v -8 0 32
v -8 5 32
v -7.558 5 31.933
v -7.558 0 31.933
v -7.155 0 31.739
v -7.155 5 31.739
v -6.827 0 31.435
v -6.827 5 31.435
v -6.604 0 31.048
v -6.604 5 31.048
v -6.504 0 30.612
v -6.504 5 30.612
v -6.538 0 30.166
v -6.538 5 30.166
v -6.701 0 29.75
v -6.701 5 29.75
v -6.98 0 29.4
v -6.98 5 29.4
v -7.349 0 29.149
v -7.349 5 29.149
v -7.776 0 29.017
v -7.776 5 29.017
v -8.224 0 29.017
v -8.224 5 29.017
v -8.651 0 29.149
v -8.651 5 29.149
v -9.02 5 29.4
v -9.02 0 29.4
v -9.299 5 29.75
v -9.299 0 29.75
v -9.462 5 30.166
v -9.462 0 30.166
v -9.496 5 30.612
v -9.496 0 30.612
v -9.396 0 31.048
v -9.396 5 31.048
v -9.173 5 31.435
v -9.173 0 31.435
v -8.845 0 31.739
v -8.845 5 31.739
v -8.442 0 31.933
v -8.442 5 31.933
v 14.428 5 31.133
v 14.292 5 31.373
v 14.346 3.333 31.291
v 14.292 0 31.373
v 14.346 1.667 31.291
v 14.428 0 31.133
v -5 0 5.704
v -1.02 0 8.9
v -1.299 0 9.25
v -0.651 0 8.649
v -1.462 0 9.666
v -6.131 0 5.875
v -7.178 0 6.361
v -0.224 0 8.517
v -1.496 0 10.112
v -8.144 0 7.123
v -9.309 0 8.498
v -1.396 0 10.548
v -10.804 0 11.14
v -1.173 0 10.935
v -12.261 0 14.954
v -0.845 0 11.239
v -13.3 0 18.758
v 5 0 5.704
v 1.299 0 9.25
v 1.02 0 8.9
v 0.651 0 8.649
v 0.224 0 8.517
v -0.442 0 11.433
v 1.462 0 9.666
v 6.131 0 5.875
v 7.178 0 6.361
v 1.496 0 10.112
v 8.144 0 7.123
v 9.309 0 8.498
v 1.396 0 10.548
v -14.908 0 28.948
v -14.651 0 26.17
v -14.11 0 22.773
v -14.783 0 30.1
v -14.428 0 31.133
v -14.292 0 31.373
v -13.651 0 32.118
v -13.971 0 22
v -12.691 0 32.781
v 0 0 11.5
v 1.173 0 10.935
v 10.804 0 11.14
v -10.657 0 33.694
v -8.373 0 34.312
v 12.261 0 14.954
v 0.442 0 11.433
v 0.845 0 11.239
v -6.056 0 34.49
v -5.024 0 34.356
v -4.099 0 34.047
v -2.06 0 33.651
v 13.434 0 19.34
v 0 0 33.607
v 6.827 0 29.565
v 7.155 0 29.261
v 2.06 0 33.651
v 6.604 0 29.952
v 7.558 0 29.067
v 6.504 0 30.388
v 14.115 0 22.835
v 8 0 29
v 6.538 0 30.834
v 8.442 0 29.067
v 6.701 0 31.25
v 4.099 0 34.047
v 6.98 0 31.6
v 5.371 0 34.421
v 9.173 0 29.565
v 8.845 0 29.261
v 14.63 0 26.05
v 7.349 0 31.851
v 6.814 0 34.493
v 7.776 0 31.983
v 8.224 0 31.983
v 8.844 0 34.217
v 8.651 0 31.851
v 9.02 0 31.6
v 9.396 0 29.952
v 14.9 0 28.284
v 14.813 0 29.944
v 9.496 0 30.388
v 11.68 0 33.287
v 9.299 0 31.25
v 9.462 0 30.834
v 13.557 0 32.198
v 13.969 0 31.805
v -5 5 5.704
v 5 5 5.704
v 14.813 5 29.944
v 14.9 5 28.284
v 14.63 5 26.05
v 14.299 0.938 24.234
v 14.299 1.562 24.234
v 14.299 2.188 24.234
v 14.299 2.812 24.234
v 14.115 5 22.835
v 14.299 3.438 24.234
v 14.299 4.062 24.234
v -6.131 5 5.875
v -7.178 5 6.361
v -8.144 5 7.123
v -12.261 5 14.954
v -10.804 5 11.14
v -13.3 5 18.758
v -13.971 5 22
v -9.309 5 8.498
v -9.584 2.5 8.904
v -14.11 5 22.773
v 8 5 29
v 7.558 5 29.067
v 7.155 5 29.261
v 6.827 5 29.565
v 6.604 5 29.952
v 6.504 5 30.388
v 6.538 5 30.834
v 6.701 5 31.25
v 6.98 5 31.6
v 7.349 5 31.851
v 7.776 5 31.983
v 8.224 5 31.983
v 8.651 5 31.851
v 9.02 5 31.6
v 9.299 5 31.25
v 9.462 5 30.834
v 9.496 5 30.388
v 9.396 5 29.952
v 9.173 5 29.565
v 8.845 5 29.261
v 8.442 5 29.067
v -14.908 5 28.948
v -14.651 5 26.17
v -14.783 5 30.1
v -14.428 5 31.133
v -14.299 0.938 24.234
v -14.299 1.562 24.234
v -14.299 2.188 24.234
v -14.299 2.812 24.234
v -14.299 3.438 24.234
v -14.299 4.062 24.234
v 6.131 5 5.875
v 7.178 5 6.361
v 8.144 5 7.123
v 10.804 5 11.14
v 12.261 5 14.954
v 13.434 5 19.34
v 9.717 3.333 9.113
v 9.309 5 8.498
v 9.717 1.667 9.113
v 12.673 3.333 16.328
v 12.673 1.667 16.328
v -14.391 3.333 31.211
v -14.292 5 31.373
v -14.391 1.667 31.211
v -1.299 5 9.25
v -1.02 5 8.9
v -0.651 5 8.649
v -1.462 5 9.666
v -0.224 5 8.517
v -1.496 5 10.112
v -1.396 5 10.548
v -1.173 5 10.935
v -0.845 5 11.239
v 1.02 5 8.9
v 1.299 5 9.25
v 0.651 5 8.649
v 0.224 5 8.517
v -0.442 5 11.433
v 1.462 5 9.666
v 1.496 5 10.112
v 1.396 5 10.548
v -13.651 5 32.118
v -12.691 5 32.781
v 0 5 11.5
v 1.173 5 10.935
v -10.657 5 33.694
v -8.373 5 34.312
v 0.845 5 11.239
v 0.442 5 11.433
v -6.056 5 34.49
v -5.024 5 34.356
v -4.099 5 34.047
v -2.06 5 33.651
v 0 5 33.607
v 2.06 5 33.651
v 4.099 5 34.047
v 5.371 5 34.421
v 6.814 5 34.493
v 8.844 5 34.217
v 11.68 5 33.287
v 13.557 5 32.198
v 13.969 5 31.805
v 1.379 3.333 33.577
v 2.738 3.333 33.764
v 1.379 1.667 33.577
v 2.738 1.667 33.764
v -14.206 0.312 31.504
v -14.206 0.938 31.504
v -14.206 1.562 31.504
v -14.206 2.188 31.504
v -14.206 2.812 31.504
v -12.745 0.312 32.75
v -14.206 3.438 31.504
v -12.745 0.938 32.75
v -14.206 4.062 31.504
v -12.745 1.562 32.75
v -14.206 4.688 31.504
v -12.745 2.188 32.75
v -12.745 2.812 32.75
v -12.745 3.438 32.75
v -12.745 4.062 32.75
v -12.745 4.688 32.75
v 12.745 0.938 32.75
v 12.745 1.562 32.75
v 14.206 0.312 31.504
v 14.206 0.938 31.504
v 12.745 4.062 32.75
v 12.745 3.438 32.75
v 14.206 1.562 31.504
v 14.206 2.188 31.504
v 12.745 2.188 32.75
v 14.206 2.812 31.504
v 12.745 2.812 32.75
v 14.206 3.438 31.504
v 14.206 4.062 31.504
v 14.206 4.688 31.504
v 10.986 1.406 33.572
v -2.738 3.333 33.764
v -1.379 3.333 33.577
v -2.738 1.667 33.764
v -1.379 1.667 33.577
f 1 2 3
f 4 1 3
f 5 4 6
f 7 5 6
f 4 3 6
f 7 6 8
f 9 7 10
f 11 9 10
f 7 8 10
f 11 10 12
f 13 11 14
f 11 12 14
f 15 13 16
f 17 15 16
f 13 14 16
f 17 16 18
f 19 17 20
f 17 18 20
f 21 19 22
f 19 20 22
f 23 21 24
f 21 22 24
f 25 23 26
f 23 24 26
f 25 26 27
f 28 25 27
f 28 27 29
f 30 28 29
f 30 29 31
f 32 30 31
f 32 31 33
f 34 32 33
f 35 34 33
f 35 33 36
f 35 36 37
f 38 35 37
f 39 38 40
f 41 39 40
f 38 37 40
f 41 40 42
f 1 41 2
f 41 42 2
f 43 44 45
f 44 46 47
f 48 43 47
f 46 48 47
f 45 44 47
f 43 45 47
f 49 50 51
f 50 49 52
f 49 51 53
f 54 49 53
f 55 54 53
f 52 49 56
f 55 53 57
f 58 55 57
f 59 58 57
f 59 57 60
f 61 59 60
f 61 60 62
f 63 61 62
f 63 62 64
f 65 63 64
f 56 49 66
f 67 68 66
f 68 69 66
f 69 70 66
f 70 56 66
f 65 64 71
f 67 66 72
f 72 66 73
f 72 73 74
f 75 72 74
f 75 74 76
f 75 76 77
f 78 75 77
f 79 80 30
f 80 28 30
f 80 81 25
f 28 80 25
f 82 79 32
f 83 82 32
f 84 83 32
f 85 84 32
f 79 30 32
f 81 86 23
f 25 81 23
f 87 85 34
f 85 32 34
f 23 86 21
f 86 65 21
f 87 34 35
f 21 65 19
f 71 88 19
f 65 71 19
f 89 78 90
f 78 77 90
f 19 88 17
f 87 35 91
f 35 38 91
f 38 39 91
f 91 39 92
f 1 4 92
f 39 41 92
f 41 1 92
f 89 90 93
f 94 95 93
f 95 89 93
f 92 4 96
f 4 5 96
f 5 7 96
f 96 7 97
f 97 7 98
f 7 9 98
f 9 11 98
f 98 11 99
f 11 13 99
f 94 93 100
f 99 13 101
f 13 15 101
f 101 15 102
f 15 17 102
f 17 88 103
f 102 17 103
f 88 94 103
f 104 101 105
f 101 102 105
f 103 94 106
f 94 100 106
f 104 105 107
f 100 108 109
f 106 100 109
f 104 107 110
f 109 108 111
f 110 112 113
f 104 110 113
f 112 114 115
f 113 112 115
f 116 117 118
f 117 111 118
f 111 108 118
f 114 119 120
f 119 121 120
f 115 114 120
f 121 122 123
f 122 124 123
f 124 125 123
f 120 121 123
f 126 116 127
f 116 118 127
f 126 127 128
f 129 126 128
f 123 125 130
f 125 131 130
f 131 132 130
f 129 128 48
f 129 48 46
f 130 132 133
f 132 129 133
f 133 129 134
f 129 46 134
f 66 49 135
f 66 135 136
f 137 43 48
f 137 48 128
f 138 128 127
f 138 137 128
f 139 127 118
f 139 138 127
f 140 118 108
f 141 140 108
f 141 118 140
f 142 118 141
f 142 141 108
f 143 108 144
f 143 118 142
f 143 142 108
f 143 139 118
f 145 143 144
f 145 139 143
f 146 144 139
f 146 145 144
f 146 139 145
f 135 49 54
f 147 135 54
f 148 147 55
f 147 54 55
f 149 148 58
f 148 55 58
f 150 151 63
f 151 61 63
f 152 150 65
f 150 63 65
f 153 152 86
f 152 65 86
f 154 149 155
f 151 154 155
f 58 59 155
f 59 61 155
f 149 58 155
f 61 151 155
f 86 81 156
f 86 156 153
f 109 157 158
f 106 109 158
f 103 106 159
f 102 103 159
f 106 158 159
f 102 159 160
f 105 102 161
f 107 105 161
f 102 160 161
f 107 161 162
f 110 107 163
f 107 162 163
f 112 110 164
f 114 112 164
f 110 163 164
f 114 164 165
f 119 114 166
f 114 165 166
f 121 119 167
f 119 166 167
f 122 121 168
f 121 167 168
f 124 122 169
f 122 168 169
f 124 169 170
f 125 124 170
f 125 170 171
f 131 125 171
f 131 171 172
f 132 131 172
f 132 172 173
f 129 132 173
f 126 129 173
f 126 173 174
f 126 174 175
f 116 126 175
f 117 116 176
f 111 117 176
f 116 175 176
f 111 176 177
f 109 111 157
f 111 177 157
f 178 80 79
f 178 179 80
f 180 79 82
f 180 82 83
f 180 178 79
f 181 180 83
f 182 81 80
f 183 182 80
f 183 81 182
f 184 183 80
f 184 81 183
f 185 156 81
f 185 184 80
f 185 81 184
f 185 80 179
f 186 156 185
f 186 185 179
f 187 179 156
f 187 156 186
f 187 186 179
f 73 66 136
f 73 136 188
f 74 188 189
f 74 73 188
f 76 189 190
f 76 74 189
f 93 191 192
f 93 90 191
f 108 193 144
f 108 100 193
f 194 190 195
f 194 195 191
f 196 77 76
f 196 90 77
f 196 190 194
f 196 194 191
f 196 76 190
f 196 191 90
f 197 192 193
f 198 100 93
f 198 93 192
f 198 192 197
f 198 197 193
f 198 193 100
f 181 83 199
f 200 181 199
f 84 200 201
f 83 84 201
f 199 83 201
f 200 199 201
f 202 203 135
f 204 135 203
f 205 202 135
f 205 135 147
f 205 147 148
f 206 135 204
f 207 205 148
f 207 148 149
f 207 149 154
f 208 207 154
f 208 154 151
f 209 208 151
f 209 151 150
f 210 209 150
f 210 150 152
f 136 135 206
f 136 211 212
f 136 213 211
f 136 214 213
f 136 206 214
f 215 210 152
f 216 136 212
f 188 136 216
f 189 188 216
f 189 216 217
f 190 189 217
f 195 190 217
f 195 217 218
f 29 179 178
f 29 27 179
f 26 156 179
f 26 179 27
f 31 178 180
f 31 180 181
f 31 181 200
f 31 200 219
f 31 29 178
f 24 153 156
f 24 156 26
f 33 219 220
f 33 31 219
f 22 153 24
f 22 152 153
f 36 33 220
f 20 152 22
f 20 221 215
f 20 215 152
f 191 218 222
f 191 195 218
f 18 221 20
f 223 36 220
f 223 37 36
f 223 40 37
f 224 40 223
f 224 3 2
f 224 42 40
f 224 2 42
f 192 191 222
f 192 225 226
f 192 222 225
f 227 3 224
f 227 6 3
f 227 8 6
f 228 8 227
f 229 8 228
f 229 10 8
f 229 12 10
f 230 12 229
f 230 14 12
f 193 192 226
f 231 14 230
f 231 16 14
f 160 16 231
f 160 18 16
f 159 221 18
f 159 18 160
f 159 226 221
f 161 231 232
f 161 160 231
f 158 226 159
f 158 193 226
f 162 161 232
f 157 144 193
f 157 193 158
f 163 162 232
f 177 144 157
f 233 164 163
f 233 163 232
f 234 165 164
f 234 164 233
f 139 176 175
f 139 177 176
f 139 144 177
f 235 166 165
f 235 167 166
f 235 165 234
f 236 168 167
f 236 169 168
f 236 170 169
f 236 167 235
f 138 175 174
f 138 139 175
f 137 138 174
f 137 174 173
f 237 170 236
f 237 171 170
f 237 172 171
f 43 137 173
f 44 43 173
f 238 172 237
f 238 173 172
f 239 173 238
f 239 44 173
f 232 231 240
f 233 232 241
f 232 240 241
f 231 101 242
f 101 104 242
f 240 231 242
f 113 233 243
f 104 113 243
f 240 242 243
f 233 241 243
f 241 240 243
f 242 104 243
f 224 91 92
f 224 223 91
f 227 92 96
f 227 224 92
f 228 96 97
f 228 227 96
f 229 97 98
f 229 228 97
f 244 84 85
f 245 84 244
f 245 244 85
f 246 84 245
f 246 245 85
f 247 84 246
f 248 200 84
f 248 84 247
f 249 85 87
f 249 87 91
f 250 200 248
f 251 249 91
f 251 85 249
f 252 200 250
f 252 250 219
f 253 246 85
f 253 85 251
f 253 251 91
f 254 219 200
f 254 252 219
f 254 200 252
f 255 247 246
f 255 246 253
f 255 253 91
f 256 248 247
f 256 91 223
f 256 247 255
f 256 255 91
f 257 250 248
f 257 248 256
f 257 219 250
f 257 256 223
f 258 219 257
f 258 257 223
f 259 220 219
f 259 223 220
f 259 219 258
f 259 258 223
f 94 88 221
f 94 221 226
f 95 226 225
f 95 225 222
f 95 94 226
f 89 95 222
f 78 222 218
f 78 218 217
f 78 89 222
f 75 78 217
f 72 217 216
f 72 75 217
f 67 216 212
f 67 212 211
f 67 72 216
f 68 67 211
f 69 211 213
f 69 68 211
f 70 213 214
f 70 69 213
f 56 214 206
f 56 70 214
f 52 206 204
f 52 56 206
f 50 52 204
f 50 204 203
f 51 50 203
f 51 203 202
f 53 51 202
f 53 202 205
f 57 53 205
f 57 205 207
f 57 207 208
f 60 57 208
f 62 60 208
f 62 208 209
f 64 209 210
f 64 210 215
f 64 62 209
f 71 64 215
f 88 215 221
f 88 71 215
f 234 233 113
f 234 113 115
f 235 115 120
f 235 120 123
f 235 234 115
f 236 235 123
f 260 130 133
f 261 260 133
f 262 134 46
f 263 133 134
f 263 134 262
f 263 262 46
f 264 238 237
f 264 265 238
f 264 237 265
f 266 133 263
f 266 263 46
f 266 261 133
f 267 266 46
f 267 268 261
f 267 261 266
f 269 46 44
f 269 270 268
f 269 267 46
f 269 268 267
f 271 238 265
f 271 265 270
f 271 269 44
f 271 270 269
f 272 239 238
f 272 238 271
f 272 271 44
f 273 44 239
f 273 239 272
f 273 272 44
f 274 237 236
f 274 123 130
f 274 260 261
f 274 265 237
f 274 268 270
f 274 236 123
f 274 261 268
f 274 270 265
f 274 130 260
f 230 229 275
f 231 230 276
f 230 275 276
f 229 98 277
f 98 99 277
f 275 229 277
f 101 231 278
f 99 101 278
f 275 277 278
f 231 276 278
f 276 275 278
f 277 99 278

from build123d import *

# Parameters (mm, degrees)
CROQUIS1_R                  = 16.5
CROQUIS1_R_2                = 3.75
CROQUIS1_R_3                = 1.5
SALIENTE_EXTRUIR1_DEPTH     = 5
CROQUIS2_R                  = 5.5
CORTAR_EXTRUIR1_DEPTH       = 2
CORTAR_EXTRUIR2_START       = -5
CROQUIS4_R                  = 3
CORTAR_EXTRUIR2_DEPTH       = 2.5
CROQUIS6_R                  = 1.5
SALIENTE_EXTRUIR3_DEPTH     = 5
SALIENTE_EXTRUIR4_START     = -5
SALIENTE_EXTRUIR4_DEPTH     = 5
CORTAR_EXTRUIR3_START       = -5
CORTAR_EXTRUIR3_OUTLINE_R   = 1.5
CORTAR_EXTRUIR3_OUTLINE_R_2 = 3.75
CORTAR_EXTRUIR3_DEPTH       = 5


# Read off the part's stored shape, not the designer's step: Saliente-Extruir4, Cortar-Extruir3
with BuildPart() as part:
    # Croquis1 → Saliente-Extruir1 (new body)
    with BuildSketch(Plane(origin=(0, 0, 0), x_dir=(1, 0, 0), z_dir=(0, 1, 0))):
        with Locations(Location((0, 0, 0), (0, 0, 270))):
            Circle(CROQUIS1_R)
        with Locations(Location((0, 0, 0), (0, 0, 270))):
            Circle(CROQUIS1_R_2, mode=Mode.SUBTRACT)
        with Locations(Location((10, 0, 0), (0, 0, 270))):
            Circle(CROQUIS1_R_3, mode=Mode.SUBTRACT)
        with Locations(Location((0, -10, 0), (0, 0, 270))):
            Circle(CROQUIS1_R_3, mode=Mode.SUBTRACT)
        with Locations(Location((-10, 0, 0), (0, 0, 270))):
            Circle(CROQUIS1_R_3, mode=Mode.SUBTRACT)
        with Locations(Location((0, 10, 0), (0, 0, 270))):
            Circle(CROQUIS1_R_3, mode=Mode.SUBTRACT)
    extrude(amount=SALIENTE_EXTRUIR1_DEPTH)

    # Croquis2 → Cortar-Extruir1 (cut)
    with BuildSketch(Plane(origin=(0, 5, 0), x_dir=(1, 0, 0), z_dir=(0, 1, 0))):
        with Locations(Location((0, 0, 0), (0, 0, 270))):
            Circle(CROQUIS2_R)
    extrude(amount=-CORTAR_EXTRUIR1_DEPTH, mode=Mode.SUBTRACT)

    # Croquis4 → Cortar-Extruir2 (cut)
    with BuildSketch(Plane(origin=(0, 5, 0), x_dir=(1, 0, 0), z_dir=(0, 1, 0)).offset(CORTAR_EXTRUIR2_START)):
        with Locations(Location((10, 0, 0), (0, 0, 270))):
            Circle(CROQUIS4_R)
        with Locations(Location((-10, 0, 0), (0, 0, 270))):
            Circle(CROQUIS4_R)
        with Locations(Location((0, 10, 0), (0, 0, 270))):
            Circle(CROQUIS4_R)
    extrude(amount=CORTAR_EXTRUIR2_DEPTH, mode=Mode.SUBTRACT)

    # Croquis6 → Saliente-Extruir3 (add)
    with BuildSketch(Plane(origin=(0, 5, 0), x_dir=(1, 0, 0), z_dir=(0, 1, 0))):
        with BuildLine():
            Line((-16.499999253, -0.004966275), (0, -15.162135144))
            Line((0, -15.162135144), (16.499999253, -0.004966275))
            add(Edge.make_bspline(
                [(16.499999253, -0.004966275), (14.789720677, -16.601874141), (14.779811161, -16.438973164), (14.200732618, -20.551745369), (13.635520661, -22.485602375), (15.733267293, -30.419610193), (11.37636727, -34.073606125), (1.56418736, -36.497980996), (2.416281914, -27.975905143), (1.888822796, -23.5), (0, -23.5)],
                knots=[0, 0, 0, 0, 0.196162037, 0.24321543, 0.470533934, 0.661030556, 0.708413553, 0.918147195, 0.949927511, 1, 1, 1, 1], degree=3))
            add(Edge.make_bspline(
                [(-16.499999253, -0.004966275), (-14.789720677, -16.601874141), (-14.779811161, -16.438973164), (-14.200732618, -20.551745369), (-13.635520661, -22.485602375), (-15.733267293, -30.419610193), (-11.37636727, -34.073606125), (-1.56418736, -36.497980996), (-2.416281914, -27.975905143), (-1.888822796, -23.5), (0, -23.5)],
                knots=[0, 0, 0, 0, 0.196162037, 0.24321543, 0.470533934, 0.661030556, 0.708413553, 0.918147195, 0.949927511, 1, 1, 1, 1], degree=3))
        make_face()
        with Locations(Location((-8, -30.5, 0), (0, 0, 270))):
            Circle(CROQUIS6_R, mode=Mode.SUBTRACT)
        with Locations(Location((8, -30.5, 0), (0, 0, 90))):
            Circle(CROQUIS6_R, mode=Mode.SUBTRACT)
    extrude(amount=-SALIENTE_EXTRUIR3_DEPTH)

    # Saliente-Extruir4 outline → Saliente-Extruir4 (add)
    with BuildSketch(Plane(origin=(0, 5, 0), x_dir=(1, 0, 0), z_dir=(0, 1, 0)).offset(SALIENTE_EXTRUIR4_START)):
        with BuildLine():
            add(Edge.make_bspline(
                [(14.291966708, -31.373017759), (14.340514678, -31.295086469), (14.385698727, -31.215084368), (14.427688557, -31.133168853)],
                knots=[0.343293779, 0.343293779, 0.343293779, 0.343293779, 0.350896071, 0.350896071, 0.350896071, 0.350896071], degree=3))
            add(Edge.make_bspline(
                [(14.291966708, -31.373017759), (14.349575443, -31.290166182), (14.395146457, -31.209972546), (14.427688557, -31.133168853)],
                knots=[0.96489404, 0.96489404, 0.96489404, 0.96489404, 1, 1, 1, 1], degree=3))
        make_face()
        with BuildLine():
            add(Edge.make_bspline(
                [(-14.427688557, -31.133168853), (-14.395146457, -31.209972546), (-14.349575443, -31.290166182), (-14.291966708, -31.373017759)],
                knots=[0, 0, 0, 0, 0.03510596, 0.03510596, 0.03510596, 0.03510596], degree=3))
            add(Edge.make_bspline(
                [(-14.427688557, -31.133168853), (-14.385698727, -31.215084368), (-14.340514678, -31.295086469), (-14.291966708, -31.373017759)],
                knots=[0.649103929, 0.649103929, 0.649103929, 0.649103929, 0.656706221, 0.656706221, 0.656706221, 0.656706221], degree=3))
        make_face()
        with BuildLine():
            add(Edge.make_bspline(
                [(0, -33.607159893), (1.397517326, -33.429434313), (2.728240909, -33.755145964), (4.099311118, -34.046838013)],
                knots=[0, 0, 0, 0, 0.263268598, 0.263268598, 0.263268598, 0.263268598], degree=3))
            add(Edge.make_bspline(
                [(0, -23.5), (1.888822796, -23.5), (2.416281914, -27.975905143), (1.994660589, -32.192677678), (3.074818283, -33.563655557), (4.099311118, -34.046838013)],
                knots=[0, 0, 0, 0, 0.050072489, 0.081852805, 0.144278664, 0.144278664, 0.144278664, 0.144278664], degree=3))
            add(Edge.make_bspline(
                [(-4.099311115, -34.046838012), (-3.074818281, -33.563655555), (-1.994660589, -32.192677676), (-2.416281914, -27.975905143), (-1.888822796, -23.5), (0, -23.5)],
                knots=[0.855721336, 0.855721336, 0.855721336, 0.855721336, 0.918147195, 0.949927511, 1, 1, 1, 1], degree=3))
            add(Edge.make_bspline(
                [(-4.099311115, -34.046838012), (-2.728240907, -33.755145963), (-1.397517325, -33.429434314), (0, -33.607159893)],
                knots=[0.736731402, 0.736731402, 0.736731402, 0.736731402, 1, 1, 1, 1], degree=3))
        make_face()
    extrude(amount=SALIENTE_EXTRUIR4_DEPTH)

    # Cortar-Extruir3 outline → Cortar-Extruir3 (cut)
    with BuildSketch(Plane(origin=(0, 5, 0), x_dir=(1, 0, 0), z_dir=(0, 1, 0)).offset(CORTAR_EXTRUIR3_START)):
        with BuildLine():
            add(Edge.make_bspline(
                [(-5, -5.704095984), (-6.82751306, -5.704095984), (-11.278769384, -9.499460435), (-13.360021763, -18.603666683), (-13.970897338, -21.999566183)],
                knots=[0, 0, 0, 0, 0.255170628, 0.749384094, 0.749384094, 0.749384094, 0.749384094], degree=3))
            Line((-5, -5.704095984), (5, -5.704095984))
            add(Edge.make_bspline(
                [(5, -5.704095984), (10.679811422, -5.704095984), (13.347569143, -18.187313933), (14.115183744, -22.835331636)],
                knots=[0, 0, 0, 0, 0.793056467, 0.793056467, 0.793056467, 0.793056467], degree=3))
            add(Edge.make_bspline(
                [(14.115183744, -22.835331636), (13.982038213, -21.263217458), (14.258823228, -20.139170168), (14.762278608, -16.563494089), (14.787566831, -16.590643141), (16.153585525, -3.36328332)],
                knots=[0.576667959, 0.576667959, 0.576667959, 0.576667959, 0.75678457, 0.803837963, 0.985753813, 0.985753813, 0.985753813, 0.985753813], degree=3))
            ThreePointArc((16.153585525, -3.36328332), (0, 16.5), (-16.153585525, -3.36328332))
            add(Edge.make_bspline(
                [(-16.153585525, -3.36328332), (-14.787566831, -16.590643141), (-14.762278608, -16.563494089), (-14.261753936, -20.118355485), (-13.987841454, -21.239556576), (-14.110086789, -22.773329956)],
                knots=[0.014246187, 0.014246187, 0.014246187, 0.014246187, 0.196162037, 0.24321543, 0.420950675, 0.420950675, 0.420950675, 0.420950675], degree=3))
            Line((-14.110086789, -22.773329956), (-13.970897338, -21.999566183))
        make_face()
        with Locations((-10, 0)):
            Circle(CORTAR_EXTRUIR3_OUTLINE_R, mode=Mode.SUBTRACT)
        Circle(CORTAR_EXTRUIR3_OUTLINE_R_2, mode=Mode.SUBTRACT)
        with Locations((10, 0)):
            Circle(CORTAR_EXTRUIR3_OUTLINE_R, mode=Mode.SUBTRACT)
        with Locations((0, 10)):
            Circle(CORTAR_EXTRUIR3_OUTLINE_R, mode=Mode.SUBTRACT)
    extrude(amount=CORTAR_EXTRUIR3_DEPTH, mode=Mode.SUBTRACT)


solid = part.part
